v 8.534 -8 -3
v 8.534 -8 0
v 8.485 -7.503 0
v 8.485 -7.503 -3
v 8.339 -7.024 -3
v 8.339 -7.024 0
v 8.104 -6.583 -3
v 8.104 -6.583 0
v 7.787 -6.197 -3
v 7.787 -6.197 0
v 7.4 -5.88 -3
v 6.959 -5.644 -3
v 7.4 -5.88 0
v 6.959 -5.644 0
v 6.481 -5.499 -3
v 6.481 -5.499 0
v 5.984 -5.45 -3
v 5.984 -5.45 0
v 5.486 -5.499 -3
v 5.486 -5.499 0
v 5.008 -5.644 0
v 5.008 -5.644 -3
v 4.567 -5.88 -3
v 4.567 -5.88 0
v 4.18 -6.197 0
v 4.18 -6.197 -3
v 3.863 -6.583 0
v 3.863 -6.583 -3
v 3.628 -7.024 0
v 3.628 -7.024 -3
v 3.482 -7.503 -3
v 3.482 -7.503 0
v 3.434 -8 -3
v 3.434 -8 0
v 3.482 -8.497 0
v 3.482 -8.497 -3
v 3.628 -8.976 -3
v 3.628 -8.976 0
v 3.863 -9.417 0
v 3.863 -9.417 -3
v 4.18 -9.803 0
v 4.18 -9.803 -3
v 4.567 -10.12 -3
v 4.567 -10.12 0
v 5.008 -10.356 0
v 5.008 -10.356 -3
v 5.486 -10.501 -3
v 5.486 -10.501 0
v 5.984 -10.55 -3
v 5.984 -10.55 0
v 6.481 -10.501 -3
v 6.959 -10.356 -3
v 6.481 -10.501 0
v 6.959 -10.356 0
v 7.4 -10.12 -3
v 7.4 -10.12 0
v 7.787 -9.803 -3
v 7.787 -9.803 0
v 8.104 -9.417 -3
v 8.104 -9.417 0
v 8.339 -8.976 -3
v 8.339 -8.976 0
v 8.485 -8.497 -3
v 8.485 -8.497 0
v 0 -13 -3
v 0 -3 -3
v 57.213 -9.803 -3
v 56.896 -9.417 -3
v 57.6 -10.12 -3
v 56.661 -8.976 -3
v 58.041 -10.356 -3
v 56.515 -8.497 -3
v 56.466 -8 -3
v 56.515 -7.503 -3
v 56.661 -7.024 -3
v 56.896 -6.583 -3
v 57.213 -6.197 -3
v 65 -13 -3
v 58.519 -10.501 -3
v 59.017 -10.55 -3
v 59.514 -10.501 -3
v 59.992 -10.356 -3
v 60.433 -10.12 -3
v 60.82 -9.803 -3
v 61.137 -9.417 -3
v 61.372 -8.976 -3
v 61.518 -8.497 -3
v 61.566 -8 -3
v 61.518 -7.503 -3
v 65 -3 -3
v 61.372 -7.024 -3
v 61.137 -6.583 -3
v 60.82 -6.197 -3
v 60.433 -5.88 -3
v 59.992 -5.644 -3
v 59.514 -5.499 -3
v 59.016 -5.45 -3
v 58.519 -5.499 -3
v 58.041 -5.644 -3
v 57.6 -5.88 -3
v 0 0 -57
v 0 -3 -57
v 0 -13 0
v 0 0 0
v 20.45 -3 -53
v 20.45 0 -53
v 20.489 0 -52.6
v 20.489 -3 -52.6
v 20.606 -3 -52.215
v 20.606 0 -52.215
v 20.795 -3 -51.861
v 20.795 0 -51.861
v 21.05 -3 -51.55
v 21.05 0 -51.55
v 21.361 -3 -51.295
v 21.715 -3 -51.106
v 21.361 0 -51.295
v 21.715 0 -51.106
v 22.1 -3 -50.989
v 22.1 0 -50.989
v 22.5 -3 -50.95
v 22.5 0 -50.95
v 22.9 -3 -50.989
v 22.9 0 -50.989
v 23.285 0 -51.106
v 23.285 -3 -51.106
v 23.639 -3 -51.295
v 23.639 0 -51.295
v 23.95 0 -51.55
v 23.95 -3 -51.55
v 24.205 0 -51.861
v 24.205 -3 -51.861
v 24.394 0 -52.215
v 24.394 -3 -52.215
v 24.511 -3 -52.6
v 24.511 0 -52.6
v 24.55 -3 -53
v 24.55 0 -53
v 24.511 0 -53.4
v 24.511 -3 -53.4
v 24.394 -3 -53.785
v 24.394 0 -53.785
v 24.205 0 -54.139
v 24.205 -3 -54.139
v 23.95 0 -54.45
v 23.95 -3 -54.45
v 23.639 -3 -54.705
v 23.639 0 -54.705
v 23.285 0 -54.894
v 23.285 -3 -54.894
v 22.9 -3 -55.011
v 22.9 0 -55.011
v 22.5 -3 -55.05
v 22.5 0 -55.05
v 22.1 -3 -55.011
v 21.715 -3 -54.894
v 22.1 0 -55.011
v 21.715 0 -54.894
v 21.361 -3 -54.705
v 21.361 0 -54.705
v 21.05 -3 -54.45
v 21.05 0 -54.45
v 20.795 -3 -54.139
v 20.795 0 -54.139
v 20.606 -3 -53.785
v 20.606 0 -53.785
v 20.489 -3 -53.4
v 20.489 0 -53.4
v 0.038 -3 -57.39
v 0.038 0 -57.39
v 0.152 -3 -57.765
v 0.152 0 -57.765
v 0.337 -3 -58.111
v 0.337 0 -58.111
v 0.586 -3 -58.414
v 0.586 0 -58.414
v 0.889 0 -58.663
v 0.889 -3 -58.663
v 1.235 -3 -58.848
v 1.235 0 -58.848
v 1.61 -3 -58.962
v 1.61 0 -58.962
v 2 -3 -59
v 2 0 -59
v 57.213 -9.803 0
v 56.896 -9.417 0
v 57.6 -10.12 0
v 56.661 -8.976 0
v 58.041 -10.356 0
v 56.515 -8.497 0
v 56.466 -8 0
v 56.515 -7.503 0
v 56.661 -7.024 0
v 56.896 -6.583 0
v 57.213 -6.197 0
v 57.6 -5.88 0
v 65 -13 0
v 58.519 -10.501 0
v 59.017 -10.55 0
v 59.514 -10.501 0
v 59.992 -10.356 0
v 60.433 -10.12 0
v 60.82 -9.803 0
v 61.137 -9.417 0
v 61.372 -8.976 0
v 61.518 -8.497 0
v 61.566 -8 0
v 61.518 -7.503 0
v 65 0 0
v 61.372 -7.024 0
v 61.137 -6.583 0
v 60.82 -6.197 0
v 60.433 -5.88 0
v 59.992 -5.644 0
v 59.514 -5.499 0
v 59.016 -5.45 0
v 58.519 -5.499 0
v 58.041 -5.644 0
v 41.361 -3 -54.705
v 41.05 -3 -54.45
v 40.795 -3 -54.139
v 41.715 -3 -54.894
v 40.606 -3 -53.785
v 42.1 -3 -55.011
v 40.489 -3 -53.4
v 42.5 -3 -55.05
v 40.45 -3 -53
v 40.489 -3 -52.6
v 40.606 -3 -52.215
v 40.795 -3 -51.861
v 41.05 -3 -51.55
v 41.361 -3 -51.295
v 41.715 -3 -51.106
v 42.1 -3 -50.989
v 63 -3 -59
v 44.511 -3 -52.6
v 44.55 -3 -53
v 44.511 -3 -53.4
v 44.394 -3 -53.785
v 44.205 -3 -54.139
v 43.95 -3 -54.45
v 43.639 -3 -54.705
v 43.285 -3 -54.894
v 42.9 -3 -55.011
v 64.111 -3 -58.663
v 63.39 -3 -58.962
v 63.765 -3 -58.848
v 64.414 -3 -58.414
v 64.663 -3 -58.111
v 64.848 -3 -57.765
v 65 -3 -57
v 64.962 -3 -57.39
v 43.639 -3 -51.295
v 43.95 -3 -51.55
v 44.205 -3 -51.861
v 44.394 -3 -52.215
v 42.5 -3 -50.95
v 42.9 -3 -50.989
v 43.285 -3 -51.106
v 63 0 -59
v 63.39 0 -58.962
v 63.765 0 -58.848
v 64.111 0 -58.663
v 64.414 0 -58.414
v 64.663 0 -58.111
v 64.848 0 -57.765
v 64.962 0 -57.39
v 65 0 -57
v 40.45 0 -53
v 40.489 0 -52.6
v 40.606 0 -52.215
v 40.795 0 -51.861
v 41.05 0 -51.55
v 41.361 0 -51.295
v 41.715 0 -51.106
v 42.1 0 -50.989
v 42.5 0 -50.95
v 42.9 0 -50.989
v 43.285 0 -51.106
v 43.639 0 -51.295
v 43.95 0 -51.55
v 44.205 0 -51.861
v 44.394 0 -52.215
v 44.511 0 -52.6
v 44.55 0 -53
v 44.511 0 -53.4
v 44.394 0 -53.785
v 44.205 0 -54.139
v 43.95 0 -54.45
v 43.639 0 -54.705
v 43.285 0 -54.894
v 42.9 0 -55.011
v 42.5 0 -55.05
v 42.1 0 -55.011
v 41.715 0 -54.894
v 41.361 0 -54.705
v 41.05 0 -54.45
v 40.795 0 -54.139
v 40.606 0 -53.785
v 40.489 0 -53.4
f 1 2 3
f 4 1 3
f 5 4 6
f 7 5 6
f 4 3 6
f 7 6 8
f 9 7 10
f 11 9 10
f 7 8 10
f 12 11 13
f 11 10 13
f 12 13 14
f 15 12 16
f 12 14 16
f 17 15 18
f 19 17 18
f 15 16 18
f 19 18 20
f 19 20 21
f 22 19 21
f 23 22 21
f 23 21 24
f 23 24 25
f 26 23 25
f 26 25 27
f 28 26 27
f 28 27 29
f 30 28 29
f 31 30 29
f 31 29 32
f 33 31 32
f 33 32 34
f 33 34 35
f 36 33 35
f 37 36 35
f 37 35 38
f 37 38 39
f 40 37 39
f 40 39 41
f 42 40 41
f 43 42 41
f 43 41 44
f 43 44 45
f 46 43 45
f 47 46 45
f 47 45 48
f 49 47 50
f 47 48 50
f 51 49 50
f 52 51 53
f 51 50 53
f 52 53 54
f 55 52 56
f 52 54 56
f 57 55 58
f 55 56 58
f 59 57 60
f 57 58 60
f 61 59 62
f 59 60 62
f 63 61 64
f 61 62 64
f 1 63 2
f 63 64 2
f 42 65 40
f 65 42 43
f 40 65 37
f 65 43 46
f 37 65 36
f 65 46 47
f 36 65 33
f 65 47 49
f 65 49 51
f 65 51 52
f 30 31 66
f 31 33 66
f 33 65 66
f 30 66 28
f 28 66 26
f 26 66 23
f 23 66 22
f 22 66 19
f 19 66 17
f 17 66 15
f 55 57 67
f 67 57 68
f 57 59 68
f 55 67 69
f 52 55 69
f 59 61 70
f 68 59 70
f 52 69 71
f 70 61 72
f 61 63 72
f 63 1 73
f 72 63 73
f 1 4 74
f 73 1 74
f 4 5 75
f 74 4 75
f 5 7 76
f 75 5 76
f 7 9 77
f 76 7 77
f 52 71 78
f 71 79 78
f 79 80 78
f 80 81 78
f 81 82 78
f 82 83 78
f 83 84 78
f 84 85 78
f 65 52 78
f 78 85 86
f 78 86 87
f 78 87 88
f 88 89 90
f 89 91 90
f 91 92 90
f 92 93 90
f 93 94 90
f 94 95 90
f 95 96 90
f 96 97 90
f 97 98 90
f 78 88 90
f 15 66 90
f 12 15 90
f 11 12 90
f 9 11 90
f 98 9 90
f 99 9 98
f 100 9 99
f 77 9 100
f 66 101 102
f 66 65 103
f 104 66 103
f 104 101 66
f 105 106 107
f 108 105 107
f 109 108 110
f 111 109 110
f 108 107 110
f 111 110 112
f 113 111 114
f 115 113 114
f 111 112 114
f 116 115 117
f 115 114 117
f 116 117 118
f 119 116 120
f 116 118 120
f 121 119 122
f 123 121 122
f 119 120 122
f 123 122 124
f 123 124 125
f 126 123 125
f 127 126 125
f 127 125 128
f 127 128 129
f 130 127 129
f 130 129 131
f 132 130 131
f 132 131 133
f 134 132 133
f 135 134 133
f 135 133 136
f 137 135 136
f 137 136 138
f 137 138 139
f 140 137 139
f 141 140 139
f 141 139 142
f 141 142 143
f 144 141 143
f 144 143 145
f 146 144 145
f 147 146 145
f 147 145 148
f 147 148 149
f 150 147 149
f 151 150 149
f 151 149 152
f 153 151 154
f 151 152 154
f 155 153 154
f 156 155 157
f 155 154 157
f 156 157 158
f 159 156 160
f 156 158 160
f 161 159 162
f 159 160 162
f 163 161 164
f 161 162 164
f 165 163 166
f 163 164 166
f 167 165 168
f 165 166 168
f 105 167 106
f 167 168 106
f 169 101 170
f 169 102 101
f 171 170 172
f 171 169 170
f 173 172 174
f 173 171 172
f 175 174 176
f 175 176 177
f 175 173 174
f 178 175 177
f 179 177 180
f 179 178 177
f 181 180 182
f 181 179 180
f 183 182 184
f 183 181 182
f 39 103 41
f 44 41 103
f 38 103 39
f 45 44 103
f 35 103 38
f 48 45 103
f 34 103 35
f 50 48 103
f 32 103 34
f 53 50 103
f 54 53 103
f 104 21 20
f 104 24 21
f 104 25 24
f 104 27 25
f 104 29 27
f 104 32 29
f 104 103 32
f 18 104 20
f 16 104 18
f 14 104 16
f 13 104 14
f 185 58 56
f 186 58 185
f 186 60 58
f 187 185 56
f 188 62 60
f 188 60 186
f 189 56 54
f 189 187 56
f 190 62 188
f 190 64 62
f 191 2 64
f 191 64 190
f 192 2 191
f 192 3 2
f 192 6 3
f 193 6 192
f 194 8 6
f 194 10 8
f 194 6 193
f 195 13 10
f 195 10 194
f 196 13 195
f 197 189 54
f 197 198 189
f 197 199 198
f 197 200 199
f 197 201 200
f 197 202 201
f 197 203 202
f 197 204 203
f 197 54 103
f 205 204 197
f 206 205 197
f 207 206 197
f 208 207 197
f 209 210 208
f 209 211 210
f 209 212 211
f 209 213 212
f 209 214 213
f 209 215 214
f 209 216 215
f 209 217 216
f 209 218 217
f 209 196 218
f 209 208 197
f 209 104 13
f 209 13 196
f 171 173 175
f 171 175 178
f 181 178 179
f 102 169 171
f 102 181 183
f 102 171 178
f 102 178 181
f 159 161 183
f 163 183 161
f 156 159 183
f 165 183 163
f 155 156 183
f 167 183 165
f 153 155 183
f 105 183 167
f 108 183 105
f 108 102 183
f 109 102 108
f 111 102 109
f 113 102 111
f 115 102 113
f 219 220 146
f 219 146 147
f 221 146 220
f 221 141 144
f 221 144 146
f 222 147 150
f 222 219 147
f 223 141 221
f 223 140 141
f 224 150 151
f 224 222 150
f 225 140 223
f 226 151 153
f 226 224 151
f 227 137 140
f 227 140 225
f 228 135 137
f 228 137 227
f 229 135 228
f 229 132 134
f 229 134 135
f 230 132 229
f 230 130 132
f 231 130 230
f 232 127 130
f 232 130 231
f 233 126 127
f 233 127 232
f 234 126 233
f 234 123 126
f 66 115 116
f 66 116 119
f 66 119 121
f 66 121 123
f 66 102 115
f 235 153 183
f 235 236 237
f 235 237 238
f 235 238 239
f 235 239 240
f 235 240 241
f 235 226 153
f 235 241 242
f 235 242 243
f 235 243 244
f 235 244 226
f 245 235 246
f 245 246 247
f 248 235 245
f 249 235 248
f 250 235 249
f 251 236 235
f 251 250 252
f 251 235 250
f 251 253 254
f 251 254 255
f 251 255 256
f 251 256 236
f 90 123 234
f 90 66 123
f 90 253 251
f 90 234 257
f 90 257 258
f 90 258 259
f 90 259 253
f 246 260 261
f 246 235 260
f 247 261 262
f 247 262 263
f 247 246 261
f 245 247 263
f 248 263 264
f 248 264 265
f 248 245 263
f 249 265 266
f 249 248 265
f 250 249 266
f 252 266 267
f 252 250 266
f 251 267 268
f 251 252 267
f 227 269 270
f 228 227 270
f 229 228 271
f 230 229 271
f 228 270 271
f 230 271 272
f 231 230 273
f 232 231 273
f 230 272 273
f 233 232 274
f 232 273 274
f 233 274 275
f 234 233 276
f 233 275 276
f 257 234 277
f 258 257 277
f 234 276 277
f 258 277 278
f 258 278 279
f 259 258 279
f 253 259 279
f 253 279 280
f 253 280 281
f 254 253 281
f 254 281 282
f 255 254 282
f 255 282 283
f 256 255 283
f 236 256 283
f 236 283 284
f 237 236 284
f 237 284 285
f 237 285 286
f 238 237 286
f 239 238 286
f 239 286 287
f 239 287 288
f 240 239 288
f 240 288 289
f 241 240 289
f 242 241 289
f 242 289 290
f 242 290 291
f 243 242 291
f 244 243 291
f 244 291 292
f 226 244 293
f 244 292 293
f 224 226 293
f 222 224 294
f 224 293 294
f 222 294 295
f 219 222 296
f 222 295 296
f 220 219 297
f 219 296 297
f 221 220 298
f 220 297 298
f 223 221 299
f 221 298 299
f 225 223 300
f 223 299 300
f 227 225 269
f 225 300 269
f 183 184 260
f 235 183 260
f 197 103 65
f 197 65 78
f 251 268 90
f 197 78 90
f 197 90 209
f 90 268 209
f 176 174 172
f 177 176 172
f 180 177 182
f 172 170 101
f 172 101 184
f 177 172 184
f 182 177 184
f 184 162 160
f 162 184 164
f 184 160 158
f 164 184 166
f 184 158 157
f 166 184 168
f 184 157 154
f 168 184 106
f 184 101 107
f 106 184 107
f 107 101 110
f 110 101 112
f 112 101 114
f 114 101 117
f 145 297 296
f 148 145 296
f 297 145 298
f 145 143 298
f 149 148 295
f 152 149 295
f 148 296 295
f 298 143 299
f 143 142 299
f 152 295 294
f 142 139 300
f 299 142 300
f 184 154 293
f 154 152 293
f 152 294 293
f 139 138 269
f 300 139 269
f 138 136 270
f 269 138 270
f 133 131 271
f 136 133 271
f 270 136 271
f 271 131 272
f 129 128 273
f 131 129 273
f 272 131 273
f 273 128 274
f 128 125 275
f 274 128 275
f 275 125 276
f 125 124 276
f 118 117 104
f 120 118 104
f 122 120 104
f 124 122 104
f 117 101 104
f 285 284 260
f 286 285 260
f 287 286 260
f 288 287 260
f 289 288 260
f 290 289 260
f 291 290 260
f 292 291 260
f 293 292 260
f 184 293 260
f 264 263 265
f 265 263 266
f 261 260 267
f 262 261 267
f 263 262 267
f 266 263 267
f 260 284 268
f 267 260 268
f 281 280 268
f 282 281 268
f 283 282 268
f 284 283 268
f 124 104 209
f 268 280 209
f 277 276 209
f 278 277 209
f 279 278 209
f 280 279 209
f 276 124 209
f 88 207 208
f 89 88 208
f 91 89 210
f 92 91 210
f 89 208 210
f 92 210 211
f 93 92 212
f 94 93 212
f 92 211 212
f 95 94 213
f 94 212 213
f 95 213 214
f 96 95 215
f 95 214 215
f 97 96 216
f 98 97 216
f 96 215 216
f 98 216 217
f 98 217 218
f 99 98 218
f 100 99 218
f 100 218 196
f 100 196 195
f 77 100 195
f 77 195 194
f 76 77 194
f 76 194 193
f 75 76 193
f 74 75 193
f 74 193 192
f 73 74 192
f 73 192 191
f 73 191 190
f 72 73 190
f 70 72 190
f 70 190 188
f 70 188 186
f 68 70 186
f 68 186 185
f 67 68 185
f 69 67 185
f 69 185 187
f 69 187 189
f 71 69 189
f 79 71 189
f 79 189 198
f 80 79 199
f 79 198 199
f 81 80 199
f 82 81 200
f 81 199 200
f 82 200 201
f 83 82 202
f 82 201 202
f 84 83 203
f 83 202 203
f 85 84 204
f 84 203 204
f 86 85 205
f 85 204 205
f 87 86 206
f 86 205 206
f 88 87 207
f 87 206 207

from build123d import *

# Parameters (mm, degrees)
F0_W     = 65
F0_H     = 59
F1_DEPTH = 3
F2_W     = 65
F2_H     = 3
F3_DEPTH = 10
F4_R     = 2.55
F5_DEPTH = 25
F6_R     = 2.05
F7_DEPTH = 25
F8_R     = 2


with BuildPart() as f1:
    # F0 (on Front) → F1 (new body)
    with BuildSketch(Plane.XZ):
        with Locations((32.5, -29.5)):
            Rectangle(F0_W, F0_H)
    extrude(amount=F1_DEPTH)

    # F2 (on face) → F3 (join)
    with BuildSketch(Plane.XZ.offset(3)):
        with Locations((32.5, -1.5)):
            Rectangle(F2_W, F2_H)
    extrude(amount=F3_DEPTH)

    # F4 (on face) → F5 (cut)
    with BuildSketch(Plane.XY):
        with Locations((59.0165, -8)):
            Circle(F4_R)
        with Locations((5.9835, -8)):
            Circle(F4_R)
    extrude(amount=-F5_DEPTH, mode=Mode.SUBTRACT)

    # F6 (on face) → F7 (cut)
    with BuildSketch(Plane(origin=(0, 0, 0), x_dir=(-1, 0, 0), z_dir=(0, 1, 0))):
        with Locations((-42.5, -53)):
            Circle(F6_R)
        with Locations((-22.5, -53)):
            Circle(F6_R)
    extrude(amount=-F7_DEPTH, mode=Mode.SUBTRACT)

    # F8
    f8_edges = [f1.edges().sort_by_distance(p)[0] for p in [
        (65, -1.5, -59),
        (0, -1.5, -59),
    ]]
    fillet(f8_edges, radius=F8_R)


solid = f1.part
